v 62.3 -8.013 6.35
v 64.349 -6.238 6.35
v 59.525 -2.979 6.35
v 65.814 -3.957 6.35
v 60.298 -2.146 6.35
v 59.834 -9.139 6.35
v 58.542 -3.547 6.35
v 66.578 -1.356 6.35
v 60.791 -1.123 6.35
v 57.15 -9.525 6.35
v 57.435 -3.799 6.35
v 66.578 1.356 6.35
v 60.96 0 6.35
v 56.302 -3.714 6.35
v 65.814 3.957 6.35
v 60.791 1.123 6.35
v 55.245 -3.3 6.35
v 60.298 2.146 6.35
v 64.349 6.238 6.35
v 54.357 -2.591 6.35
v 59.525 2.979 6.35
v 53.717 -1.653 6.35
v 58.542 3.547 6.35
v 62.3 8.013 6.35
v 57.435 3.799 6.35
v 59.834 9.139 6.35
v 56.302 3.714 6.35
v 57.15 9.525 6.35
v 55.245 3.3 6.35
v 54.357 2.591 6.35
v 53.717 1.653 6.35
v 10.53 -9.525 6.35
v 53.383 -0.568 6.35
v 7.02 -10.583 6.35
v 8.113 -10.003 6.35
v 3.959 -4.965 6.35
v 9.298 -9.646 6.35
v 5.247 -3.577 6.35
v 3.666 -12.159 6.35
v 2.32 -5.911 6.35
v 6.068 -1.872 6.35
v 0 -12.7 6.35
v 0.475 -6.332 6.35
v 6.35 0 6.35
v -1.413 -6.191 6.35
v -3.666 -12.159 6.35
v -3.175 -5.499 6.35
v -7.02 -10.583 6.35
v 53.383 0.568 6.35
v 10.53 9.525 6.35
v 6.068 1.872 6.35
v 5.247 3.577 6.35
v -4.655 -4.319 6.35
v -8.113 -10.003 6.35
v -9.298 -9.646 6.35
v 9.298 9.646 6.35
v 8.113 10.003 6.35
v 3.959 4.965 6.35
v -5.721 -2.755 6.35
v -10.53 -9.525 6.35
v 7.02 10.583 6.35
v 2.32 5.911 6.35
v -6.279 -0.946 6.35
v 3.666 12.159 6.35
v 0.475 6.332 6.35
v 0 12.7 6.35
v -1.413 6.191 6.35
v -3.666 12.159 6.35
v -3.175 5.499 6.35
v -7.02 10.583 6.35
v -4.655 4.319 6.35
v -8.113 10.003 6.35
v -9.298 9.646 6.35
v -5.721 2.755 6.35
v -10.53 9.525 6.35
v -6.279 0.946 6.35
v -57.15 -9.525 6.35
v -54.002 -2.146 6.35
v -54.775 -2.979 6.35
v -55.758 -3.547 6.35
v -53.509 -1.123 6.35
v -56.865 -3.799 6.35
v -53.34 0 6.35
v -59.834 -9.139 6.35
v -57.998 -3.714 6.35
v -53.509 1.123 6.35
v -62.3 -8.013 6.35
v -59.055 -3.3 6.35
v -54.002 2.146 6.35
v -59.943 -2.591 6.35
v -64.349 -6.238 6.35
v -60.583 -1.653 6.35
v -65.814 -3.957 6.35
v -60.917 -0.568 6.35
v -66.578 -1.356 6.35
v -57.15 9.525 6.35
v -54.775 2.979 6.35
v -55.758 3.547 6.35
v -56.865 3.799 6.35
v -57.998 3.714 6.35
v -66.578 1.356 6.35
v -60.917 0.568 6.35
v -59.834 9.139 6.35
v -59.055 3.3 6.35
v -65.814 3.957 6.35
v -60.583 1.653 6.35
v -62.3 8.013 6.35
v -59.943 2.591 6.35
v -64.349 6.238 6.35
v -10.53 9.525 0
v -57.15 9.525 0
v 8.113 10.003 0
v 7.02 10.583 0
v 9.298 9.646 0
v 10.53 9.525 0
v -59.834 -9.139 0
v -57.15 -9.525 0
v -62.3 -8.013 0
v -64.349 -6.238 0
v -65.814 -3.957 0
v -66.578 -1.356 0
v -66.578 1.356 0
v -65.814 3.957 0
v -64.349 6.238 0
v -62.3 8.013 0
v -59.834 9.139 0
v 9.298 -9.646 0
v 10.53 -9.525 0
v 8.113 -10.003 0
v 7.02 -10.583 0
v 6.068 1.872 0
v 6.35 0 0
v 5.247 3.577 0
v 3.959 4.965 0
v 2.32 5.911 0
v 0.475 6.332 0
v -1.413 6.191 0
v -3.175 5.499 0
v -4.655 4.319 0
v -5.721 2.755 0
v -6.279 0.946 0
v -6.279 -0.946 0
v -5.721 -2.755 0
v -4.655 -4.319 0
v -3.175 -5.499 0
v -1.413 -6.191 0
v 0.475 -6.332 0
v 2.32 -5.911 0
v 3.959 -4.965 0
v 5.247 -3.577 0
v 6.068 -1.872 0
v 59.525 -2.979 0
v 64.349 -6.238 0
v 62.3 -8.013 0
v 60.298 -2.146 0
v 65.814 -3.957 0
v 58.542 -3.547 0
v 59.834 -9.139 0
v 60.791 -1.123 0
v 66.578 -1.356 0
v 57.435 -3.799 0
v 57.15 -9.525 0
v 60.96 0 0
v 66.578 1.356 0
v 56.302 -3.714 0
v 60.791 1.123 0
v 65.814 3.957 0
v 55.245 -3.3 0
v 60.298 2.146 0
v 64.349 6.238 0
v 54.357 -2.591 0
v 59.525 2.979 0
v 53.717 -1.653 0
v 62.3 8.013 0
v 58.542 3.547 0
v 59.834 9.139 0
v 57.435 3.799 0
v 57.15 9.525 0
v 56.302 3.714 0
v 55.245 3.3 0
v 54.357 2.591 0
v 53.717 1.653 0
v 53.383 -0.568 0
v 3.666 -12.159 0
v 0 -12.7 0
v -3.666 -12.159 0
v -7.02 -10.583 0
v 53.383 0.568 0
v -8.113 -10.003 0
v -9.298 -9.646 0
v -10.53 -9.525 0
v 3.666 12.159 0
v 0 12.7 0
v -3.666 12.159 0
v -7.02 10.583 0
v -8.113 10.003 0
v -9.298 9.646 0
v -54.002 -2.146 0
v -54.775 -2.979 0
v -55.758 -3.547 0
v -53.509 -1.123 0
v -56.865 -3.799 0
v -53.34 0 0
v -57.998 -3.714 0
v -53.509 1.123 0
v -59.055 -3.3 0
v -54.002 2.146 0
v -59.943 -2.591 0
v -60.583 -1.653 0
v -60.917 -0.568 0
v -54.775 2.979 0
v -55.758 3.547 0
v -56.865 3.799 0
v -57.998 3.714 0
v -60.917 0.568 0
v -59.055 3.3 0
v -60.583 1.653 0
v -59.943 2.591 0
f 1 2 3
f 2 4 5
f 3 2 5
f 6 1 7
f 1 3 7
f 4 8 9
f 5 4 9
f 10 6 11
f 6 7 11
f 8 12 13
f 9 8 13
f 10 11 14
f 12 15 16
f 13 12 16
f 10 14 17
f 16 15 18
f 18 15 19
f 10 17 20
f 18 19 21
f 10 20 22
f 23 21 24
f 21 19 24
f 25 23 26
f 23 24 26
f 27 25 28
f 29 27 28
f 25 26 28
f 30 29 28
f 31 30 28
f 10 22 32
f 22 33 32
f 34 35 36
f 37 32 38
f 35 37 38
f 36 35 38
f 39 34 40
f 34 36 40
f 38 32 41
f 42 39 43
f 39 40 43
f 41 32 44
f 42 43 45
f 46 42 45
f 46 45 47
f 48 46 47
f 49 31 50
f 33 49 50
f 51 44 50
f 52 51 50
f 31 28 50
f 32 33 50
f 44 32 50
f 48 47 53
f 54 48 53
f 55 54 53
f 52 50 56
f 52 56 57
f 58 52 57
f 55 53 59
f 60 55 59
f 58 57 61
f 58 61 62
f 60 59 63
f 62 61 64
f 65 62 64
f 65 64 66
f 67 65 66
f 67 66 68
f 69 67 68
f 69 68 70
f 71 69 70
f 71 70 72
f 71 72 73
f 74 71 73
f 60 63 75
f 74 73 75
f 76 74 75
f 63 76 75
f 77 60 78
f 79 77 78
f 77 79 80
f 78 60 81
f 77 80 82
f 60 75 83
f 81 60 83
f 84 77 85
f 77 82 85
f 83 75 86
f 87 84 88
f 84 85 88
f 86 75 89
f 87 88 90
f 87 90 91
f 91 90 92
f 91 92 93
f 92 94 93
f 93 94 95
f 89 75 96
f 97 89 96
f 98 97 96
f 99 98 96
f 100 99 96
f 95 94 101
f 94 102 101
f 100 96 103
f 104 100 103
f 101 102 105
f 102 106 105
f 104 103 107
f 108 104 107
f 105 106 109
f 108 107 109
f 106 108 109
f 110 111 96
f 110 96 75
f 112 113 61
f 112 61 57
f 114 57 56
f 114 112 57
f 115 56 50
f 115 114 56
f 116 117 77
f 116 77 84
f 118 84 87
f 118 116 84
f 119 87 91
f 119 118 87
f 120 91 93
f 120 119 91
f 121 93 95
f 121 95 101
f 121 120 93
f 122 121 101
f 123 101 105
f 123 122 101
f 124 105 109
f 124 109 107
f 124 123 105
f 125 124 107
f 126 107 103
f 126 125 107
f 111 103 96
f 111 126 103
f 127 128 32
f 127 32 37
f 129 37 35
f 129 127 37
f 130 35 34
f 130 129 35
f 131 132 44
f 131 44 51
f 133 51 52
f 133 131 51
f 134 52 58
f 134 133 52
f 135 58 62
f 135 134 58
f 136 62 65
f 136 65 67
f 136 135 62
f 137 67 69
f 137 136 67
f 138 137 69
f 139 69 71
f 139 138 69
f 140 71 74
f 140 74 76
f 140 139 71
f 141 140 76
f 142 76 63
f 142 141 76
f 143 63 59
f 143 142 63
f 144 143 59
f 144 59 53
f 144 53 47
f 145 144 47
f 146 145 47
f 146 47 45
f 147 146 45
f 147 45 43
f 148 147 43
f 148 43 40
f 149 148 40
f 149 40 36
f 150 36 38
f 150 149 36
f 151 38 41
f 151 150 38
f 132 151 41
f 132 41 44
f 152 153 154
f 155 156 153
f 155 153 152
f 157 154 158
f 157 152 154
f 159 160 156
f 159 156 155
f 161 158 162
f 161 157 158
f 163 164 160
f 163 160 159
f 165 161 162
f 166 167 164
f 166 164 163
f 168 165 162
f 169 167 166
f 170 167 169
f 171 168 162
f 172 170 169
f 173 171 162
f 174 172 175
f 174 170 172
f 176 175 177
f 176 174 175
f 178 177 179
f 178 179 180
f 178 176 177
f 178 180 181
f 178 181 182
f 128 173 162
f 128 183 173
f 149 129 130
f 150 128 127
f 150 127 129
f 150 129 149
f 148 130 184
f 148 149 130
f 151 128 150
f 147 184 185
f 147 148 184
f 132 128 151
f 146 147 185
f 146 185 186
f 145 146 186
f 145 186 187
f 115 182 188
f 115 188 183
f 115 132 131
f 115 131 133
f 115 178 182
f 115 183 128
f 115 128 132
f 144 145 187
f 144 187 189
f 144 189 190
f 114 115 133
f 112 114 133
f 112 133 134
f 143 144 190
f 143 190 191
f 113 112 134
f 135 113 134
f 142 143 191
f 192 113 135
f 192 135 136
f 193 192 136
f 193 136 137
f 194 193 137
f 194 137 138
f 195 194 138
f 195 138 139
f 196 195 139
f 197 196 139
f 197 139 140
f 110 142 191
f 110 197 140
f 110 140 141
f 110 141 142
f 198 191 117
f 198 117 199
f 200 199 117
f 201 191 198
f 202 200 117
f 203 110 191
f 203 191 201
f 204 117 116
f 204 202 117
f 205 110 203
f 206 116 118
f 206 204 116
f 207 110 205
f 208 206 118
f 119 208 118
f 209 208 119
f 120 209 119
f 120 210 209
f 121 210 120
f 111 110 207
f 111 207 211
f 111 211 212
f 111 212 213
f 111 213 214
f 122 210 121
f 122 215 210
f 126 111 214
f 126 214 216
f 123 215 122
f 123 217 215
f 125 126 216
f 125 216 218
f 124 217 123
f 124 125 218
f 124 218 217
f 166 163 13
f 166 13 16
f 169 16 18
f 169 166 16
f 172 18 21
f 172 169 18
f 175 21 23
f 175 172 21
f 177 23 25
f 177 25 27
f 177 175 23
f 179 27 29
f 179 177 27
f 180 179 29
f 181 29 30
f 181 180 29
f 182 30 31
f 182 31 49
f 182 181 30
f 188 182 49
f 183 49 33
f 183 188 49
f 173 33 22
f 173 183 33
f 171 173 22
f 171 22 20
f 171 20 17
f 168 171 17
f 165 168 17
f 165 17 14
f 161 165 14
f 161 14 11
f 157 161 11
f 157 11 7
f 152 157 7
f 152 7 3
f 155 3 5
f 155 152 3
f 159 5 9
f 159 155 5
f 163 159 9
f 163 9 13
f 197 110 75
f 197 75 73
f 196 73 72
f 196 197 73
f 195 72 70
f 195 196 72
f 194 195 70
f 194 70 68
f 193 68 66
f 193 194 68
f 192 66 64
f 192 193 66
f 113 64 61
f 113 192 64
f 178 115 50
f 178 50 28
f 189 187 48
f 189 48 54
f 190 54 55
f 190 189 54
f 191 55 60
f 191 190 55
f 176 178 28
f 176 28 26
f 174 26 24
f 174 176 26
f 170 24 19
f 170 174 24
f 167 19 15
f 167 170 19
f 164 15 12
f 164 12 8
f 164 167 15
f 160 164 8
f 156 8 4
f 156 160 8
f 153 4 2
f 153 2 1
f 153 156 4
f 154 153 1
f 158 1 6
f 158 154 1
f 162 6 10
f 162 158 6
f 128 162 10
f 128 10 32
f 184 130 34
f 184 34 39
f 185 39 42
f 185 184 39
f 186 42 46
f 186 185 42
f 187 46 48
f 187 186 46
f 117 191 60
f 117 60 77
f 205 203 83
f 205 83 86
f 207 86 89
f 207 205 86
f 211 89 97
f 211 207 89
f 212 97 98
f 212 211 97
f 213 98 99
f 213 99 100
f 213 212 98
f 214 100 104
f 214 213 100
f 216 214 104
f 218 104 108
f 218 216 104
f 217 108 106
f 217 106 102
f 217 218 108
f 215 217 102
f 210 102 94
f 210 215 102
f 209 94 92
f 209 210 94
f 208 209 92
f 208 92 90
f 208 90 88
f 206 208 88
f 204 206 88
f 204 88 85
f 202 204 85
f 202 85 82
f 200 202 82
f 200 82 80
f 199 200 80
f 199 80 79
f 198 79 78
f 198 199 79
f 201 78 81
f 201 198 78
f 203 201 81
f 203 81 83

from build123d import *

# Parameters (mm, degrees)
SKETCH1_R           = 3.81
SKETCH1_R_2         = 6.35
BOSS_EXTRUDE1_DEPTH = 6.35


with BuildPart() as part:
    # Sketch1 → Boss-Extrude1 (new body)
    with BuildSketch(Plane.XY):
        with BuildLine():
            Line((-57.15, 9.525), (-10.530283709, 9.525))
            ThreePointArc((-10.530283709, 9.525), (-8.697196605, 9.795337866), (-7.02018914, 10.583333333))
            ThreePointArc((-7.02018914, 10.583333333), (0, 12.7), (7.02018914, 10.583333333))
            ThreePointArc((7.02018914, 10.583333333), (8.697196605, 9.795337866), (10.530283709, 9.525))
            Line((10.530283709, 9.525), (57.15, 9.525))
            ThreePointArc((57.15, 9.525), (66.675, 0), (57.15, -9.525))
            Line((57.15, -9.525), (10.530283709, -9.525))
            ThreePointArc((10.530283709, -9.525), (8.697196605, -9.795337866), (7.02018914, -10.583333333))
            ThreePointArc((7.02018914, -10.583333333), (0, -12.7), (-7.02018914, -10.583333333))
            ThreePointArc((-7.02018914, -10.583333333), (-8.697196605, -9.795337866), (-10.530283709, -9.525))
            Line((-10.530283709, -9.525), (-57.15, -9.525))
            ThreePointArc((-57.15, -9.525), (-66.675, 0), (-57.15, 9.525))
        make_face()
        with Locations((-57.15, 0)):
            Circle(SKETCH1_R, mode=Mode.SUBTRACT)
        with Locations((57.15, 0)):
            Circle(SKETCH1_R, mode=Mode.SUBTRACT)
        Circle(SKETCH1_R_2, mode=Mode.SUBTRACT)
    extrude(amount=BOSS_EXTRUDE1_DEPTH)


solid = part.part
